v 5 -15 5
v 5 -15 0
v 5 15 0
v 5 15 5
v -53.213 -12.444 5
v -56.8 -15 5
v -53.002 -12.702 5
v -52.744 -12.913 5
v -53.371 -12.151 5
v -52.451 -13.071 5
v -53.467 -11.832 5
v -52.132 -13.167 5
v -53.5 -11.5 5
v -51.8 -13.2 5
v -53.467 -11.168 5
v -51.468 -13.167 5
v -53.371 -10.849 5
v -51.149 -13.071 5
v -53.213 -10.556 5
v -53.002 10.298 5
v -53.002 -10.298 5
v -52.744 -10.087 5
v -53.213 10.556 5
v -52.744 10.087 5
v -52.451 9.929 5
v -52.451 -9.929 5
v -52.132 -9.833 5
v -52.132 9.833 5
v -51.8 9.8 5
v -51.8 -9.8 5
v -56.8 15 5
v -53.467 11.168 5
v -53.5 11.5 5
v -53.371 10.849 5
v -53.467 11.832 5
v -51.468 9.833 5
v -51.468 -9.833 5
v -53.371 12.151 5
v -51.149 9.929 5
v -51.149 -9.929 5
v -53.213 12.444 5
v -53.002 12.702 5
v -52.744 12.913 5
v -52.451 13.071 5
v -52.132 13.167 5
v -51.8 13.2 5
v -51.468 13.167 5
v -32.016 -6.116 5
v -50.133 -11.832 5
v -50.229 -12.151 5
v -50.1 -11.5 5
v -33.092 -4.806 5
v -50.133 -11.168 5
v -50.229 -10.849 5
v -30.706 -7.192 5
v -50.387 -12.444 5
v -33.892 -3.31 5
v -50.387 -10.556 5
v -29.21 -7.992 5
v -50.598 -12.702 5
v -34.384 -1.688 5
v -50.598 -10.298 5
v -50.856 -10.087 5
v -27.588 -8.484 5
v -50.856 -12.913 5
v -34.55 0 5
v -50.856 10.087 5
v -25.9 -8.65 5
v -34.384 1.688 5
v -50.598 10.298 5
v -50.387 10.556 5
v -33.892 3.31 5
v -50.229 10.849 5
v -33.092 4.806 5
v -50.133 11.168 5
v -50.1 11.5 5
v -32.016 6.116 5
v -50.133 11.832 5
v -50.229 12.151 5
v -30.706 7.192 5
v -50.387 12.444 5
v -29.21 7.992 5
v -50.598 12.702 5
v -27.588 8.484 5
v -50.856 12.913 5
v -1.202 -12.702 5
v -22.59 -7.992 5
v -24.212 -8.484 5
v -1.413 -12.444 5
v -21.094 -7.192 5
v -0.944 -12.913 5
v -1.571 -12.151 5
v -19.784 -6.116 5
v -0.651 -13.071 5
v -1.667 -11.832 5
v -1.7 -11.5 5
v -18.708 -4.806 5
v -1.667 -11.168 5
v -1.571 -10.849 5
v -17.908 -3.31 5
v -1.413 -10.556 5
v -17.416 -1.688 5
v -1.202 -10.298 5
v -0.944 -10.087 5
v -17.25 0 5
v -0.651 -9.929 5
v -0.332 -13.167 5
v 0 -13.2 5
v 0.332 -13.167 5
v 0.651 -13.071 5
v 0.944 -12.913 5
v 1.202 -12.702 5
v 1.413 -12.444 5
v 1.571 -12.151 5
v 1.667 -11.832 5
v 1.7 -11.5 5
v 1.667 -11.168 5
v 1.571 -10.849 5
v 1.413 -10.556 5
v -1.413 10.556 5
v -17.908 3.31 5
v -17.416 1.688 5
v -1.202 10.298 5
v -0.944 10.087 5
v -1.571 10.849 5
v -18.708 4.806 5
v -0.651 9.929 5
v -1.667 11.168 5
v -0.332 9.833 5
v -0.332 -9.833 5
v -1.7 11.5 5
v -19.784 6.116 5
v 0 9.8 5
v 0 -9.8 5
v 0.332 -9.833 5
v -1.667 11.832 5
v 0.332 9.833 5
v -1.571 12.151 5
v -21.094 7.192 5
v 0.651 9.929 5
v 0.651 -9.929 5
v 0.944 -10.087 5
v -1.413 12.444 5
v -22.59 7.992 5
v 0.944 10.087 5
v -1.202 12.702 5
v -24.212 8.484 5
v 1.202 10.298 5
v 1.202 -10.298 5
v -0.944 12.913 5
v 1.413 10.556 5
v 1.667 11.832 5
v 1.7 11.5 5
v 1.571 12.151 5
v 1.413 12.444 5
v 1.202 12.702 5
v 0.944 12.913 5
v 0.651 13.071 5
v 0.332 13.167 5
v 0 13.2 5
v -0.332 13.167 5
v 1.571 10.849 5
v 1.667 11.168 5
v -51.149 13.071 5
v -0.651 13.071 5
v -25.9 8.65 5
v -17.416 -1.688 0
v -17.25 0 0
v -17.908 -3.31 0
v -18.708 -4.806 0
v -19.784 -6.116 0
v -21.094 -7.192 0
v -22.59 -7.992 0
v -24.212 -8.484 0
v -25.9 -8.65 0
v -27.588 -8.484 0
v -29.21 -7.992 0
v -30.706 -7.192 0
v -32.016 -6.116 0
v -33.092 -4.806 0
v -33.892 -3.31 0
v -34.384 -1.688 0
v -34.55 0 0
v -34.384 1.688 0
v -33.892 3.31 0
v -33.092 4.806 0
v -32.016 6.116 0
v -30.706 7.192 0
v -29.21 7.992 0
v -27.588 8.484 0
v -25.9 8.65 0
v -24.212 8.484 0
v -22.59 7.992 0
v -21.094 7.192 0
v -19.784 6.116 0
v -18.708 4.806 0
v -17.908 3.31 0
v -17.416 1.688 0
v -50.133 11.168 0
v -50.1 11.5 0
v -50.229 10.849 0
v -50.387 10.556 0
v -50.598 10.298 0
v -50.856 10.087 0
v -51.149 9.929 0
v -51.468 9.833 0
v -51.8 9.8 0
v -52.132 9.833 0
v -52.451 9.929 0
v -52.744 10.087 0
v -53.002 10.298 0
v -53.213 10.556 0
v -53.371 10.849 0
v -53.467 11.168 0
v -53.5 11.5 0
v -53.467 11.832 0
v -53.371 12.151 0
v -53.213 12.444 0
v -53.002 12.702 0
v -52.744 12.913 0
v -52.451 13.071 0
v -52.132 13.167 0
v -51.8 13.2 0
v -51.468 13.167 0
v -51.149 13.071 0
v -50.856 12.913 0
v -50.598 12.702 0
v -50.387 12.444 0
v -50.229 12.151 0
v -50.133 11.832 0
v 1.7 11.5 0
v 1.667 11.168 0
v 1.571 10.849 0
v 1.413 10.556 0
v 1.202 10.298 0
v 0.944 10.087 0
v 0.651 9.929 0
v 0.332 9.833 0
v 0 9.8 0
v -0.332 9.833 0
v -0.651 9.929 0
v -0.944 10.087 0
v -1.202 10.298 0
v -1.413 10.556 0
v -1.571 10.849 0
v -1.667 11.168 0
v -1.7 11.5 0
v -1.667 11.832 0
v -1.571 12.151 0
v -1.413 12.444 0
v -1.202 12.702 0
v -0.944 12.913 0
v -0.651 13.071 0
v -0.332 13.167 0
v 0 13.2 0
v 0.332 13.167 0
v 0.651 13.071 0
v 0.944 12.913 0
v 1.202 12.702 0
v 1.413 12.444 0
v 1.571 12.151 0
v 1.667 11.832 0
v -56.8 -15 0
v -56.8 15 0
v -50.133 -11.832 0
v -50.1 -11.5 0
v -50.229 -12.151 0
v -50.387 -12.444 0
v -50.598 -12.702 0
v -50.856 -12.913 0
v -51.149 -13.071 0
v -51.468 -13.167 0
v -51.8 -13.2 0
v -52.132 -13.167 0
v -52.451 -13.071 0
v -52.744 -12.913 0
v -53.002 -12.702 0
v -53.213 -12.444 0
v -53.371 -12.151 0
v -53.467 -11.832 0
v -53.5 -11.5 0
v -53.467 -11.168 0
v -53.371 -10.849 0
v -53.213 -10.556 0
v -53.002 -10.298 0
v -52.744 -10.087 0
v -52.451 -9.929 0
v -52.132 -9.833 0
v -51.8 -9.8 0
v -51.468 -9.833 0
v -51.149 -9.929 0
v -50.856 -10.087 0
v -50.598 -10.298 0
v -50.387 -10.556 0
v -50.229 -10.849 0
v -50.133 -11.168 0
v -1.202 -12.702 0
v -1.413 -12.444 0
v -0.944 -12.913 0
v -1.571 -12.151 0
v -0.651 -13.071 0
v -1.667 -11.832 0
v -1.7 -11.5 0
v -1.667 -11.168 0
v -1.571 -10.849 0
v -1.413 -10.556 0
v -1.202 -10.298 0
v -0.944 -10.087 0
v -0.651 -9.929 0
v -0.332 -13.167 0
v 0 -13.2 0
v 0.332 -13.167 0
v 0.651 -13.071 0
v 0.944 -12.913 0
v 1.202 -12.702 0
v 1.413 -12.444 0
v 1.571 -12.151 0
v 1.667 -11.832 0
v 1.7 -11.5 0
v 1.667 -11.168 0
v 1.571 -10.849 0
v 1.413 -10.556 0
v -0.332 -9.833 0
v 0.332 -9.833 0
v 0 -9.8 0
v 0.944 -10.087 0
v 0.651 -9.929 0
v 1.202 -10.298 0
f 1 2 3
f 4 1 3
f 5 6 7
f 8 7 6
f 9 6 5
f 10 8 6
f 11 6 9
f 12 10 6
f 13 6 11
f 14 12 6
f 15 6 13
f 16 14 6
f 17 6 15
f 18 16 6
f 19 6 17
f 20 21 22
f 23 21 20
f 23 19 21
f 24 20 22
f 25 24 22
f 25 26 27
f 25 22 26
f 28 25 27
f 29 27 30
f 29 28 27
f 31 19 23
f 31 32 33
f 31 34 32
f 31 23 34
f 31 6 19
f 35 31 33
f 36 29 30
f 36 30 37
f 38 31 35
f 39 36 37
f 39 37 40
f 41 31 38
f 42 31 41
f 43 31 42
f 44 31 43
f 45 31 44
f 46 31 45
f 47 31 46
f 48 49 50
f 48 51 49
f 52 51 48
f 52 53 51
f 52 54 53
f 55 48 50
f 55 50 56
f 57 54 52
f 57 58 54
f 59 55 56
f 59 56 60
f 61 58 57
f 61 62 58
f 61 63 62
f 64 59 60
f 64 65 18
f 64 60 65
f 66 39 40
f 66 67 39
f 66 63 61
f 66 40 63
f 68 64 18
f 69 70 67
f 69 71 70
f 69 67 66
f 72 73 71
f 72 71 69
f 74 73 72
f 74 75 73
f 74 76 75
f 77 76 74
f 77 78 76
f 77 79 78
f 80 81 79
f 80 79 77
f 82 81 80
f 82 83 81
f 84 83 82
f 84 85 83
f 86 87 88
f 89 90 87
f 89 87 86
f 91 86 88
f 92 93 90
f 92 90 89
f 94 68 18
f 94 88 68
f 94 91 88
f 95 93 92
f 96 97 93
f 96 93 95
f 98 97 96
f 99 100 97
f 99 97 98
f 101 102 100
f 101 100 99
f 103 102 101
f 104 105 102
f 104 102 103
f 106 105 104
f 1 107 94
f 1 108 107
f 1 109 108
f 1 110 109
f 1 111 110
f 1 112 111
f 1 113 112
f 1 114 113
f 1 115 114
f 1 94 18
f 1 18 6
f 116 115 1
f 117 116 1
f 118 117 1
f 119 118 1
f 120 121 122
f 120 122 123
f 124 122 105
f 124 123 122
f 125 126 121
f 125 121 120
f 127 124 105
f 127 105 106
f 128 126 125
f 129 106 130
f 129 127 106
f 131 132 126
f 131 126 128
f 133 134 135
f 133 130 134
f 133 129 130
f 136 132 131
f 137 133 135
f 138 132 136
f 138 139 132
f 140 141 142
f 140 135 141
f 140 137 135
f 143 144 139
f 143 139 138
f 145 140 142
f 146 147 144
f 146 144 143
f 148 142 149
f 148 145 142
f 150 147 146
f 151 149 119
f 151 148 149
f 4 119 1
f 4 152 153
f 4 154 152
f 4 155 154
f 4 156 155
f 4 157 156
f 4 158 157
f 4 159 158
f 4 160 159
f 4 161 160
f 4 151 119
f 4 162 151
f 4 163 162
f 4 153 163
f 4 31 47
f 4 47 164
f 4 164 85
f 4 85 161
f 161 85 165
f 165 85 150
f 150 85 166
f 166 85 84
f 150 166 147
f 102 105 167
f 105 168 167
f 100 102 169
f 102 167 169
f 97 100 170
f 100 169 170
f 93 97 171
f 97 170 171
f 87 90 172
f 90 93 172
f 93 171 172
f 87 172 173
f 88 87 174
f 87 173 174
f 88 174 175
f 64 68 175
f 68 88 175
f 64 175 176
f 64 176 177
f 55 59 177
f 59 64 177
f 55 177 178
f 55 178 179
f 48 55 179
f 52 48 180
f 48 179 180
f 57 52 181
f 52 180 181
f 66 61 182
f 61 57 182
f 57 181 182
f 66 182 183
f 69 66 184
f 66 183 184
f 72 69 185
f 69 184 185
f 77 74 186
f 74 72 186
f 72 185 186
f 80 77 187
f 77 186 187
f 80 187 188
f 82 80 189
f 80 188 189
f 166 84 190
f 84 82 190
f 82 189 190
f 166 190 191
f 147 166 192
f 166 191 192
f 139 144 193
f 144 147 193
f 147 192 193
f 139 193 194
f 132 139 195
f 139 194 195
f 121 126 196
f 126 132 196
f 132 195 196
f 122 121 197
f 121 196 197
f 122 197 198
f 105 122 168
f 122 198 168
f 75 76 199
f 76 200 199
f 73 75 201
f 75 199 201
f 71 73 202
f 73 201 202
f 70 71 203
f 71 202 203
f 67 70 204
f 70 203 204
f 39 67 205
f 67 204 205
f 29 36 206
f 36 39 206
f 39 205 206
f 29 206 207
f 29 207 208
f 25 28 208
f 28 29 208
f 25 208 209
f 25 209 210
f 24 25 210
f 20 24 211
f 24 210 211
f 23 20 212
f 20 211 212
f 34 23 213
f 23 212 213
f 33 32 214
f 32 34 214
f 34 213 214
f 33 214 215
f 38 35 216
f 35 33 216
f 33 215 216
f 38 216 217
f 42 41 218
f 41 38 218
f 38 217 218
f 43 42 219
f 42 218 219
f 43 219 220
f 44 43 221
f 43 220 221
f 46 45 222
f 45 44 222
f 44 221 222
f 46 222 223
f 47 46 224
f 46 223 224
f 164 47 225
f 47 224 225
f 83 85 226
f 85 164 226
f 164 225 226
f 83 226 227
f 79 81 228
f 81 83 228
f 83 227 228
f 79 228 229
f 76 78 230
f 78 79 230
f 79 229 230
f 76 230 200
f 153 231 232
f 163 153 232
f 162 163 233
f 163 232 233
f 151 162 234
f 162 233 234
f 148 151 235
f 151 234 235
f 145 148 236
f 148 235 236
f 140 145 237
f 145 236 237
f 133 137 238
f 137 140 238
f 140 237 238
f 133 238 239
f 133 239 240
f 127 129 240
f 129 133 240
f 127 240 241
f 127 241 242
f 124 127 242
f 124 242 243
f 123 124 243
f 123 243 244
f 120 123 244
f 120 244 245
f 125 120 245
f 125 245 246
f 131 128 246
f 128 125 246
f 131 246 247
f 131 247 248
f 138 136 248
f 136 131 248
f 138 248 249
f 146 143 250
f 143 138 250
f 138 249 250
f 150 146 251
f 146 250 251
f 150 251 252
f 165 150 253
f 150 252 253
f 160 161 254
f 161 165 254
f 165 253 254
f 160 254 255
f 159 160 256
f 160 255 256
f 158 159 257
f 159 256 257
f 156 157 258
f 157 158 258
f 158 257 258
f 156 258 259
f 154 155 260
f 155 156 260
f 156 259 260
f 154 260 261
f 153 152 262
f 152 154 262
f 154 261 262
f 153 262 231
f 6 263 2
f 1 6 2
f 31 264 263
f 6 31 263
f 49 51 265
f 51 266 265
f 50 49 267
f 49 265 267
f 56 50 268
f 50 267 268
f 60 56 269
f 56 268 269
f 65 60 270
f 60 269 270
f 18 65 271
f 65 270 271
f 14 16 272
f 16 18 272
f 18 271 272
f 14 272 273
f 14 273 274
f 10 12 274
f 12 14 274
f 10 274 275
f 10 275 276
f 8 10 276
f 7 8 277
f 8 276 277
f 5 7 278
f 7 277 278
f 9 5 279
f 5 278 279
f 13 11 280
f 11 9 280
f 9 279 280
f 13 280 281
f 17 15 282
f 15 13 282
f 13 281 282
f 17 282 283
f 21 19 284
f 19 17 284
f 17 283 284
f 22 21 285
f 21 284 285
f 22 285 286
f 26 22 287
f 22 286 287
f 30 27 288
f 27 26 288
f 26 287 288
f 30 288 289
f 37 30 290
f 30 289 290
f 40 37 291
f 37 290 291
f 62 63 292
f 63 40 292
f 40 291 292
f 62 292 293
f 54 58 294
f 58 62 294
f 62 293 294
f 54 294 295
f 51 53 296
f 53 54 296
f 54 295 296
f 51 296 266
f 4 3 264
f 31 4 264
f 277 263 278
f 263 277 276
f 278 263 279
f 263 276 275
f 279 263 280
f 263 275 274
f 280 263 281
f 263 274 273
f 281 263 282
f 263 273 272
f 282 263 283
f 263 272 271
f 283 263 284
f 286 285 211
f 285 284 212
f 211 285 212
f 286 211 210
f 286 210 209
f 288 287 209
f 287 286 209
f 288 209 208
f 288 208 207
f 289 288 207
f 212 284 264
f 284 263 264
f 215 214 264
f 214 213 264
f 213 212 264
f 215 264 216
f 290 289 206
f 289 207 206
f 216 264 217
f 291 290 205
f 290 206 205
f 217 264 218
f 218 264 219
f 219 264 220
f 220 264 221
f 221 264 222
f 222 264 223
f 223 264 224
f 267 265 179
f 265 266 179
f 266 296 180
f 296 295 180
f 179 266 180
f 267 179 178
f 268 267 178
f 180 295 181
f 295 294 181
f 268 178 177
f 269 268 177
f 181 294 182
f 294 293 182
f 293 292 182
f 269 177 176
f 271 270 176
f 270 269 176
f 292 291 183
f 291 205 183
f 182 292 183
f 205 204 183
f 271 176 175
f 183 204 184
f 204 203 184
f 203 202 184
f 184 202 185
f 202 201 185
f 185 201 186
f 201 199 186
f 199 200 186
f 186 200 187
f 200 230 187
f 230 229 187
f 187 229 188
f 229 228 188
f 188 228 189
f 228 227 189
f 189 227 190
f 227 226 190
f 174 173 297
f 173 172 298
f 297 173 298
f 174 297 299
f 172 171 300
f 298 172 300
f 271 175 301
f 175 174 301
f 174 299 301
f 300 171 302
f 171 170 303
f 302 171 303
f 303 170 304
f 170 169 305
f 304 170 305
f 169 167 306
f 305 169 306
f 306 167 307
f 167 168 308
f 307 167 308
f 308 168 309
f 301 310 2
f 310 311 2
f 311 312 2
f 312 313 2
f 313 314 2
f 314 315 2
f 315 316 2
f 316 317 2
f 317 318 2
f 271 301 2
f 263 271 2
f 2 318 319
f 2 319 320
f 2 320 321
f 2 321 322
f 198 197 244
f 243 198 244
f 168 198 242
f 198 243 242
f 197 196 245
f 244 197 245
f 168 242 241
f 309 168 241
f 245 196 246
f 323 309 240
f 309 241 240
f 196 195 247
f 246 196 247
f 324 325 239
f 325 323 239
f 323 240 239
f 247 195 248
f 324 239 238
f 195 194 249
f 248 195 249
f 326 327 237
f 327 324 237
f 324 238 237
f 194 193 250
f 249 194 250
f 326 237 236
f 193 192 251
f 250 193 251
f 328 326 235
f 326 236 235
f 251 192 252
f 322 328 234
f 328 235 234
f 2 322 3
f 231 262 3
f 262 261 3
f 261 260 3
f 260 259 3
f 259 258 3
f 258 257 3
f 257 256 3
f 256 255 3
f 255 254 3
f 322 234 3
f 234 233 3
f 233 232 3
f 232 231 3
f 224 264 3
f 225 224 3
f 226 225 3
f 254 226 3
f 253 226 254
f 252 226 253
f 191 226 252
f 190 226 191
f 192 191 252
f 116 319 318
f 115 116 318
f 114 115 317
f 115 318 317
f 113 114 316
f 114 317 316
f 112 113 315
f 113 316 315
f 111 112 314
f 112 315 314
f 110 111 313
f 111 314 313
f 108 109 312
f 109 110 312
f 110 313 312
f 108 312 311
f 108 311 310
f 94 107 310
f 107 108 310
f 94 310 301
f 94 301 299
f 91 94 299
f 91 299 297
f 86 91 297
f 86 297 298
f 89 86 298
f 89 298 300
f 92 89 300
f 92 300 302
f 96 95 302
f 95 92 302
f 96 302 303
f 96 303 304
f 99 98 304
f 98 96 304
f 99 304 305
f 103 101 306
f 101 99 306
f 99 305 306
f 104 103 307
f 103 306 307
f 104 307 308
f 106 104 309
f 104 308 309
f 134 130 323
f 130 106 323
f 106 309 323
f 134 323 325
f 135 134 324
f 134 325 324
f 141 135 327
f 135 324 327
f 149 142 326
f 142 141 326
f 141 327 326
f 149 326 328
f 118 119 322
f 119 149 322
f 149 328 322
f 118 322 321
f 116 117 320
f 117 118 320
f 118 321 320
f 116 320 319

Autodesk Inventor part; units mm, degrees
ref_plane "YZ Plane" through (0, 0, 0) normal (1, 0, 0) x (0, 1, 0)
ref_plane "XZ Plane" through (0, 0, 0) normal (0, 1, 0) x (-1, 0, 0)
ref_plane "XY Plane" through (0, 0, 0) normal (0, 0, 1) x (1, 0, 0)
sketch "Sketch1" plane through (0, 0, 0) normal (0, 0, 1) x (1, 0, 0)
  circle A0 centre (0, -32.5) radius 1.7 projected
  circle A1 centre (0, 11.5) radius 1.7 projected
  circle A2 centre (0, -11.5) radius 1.7 projected
  line L0 (5, 15) -> (-5, 15) projected
  line L1 (-5, 15) -> (-5, -15) projected
  line L2 (-5, -15) -> (5, -15) projected
  line L3 (5, -15) -> (5, 15) projected
  circle A3 centre (-51.8, 11.5) radius 1.7 projected
  circle A4 centre (-51.8, -11.5) radius 1.7 projected
  line L4 (-46.8, 15) -> (-56.8, 15) projected
  line L5 (-56.8, 15) -> (-56.8, -15) projected
  line L6 (-56.8, -15) -> (-46.8, -15) projected
  line L7 (-46.8, -15) -> (-46.8, 15) projected
  line L8 (-56.8, 15) -> (5, 15)
  line L9 (5, 15) -> (5, -15)
  line L10 (5, -15) -> (-56.8, -15)
  line L11 (-56.8, -15) -> (-56.8, 15)
  line L12 (-5, 0) -> (-46.8, 0) construction
  line L13 (-25.9, -15) -> (-25.9, 15) construction
  circle A5 centre (-25.9, 0) radius 8.65
  point P0 (0, 0)
  point P1 (-5, 15)
  point P2 (-46.8, 15)
  point P3 (-46.8, -15)
  point P4 (-5, -15)
  point P5 (-46.8, -15)
  point P6 (-56.8, -15)
  point P7 (-5, 15)
  point P8 (-46.8, 15)
  point P9 (-56.8, -15)
  dimension "d0" = 17.3
extrude "Extrusion1" add sketch "Sketch1" along normal blind 5 contours L3 L2 L1 L0 | L1 L10 L7 L8 | L7 L6 L5 L4
properties part number "CenterPointBracket"
